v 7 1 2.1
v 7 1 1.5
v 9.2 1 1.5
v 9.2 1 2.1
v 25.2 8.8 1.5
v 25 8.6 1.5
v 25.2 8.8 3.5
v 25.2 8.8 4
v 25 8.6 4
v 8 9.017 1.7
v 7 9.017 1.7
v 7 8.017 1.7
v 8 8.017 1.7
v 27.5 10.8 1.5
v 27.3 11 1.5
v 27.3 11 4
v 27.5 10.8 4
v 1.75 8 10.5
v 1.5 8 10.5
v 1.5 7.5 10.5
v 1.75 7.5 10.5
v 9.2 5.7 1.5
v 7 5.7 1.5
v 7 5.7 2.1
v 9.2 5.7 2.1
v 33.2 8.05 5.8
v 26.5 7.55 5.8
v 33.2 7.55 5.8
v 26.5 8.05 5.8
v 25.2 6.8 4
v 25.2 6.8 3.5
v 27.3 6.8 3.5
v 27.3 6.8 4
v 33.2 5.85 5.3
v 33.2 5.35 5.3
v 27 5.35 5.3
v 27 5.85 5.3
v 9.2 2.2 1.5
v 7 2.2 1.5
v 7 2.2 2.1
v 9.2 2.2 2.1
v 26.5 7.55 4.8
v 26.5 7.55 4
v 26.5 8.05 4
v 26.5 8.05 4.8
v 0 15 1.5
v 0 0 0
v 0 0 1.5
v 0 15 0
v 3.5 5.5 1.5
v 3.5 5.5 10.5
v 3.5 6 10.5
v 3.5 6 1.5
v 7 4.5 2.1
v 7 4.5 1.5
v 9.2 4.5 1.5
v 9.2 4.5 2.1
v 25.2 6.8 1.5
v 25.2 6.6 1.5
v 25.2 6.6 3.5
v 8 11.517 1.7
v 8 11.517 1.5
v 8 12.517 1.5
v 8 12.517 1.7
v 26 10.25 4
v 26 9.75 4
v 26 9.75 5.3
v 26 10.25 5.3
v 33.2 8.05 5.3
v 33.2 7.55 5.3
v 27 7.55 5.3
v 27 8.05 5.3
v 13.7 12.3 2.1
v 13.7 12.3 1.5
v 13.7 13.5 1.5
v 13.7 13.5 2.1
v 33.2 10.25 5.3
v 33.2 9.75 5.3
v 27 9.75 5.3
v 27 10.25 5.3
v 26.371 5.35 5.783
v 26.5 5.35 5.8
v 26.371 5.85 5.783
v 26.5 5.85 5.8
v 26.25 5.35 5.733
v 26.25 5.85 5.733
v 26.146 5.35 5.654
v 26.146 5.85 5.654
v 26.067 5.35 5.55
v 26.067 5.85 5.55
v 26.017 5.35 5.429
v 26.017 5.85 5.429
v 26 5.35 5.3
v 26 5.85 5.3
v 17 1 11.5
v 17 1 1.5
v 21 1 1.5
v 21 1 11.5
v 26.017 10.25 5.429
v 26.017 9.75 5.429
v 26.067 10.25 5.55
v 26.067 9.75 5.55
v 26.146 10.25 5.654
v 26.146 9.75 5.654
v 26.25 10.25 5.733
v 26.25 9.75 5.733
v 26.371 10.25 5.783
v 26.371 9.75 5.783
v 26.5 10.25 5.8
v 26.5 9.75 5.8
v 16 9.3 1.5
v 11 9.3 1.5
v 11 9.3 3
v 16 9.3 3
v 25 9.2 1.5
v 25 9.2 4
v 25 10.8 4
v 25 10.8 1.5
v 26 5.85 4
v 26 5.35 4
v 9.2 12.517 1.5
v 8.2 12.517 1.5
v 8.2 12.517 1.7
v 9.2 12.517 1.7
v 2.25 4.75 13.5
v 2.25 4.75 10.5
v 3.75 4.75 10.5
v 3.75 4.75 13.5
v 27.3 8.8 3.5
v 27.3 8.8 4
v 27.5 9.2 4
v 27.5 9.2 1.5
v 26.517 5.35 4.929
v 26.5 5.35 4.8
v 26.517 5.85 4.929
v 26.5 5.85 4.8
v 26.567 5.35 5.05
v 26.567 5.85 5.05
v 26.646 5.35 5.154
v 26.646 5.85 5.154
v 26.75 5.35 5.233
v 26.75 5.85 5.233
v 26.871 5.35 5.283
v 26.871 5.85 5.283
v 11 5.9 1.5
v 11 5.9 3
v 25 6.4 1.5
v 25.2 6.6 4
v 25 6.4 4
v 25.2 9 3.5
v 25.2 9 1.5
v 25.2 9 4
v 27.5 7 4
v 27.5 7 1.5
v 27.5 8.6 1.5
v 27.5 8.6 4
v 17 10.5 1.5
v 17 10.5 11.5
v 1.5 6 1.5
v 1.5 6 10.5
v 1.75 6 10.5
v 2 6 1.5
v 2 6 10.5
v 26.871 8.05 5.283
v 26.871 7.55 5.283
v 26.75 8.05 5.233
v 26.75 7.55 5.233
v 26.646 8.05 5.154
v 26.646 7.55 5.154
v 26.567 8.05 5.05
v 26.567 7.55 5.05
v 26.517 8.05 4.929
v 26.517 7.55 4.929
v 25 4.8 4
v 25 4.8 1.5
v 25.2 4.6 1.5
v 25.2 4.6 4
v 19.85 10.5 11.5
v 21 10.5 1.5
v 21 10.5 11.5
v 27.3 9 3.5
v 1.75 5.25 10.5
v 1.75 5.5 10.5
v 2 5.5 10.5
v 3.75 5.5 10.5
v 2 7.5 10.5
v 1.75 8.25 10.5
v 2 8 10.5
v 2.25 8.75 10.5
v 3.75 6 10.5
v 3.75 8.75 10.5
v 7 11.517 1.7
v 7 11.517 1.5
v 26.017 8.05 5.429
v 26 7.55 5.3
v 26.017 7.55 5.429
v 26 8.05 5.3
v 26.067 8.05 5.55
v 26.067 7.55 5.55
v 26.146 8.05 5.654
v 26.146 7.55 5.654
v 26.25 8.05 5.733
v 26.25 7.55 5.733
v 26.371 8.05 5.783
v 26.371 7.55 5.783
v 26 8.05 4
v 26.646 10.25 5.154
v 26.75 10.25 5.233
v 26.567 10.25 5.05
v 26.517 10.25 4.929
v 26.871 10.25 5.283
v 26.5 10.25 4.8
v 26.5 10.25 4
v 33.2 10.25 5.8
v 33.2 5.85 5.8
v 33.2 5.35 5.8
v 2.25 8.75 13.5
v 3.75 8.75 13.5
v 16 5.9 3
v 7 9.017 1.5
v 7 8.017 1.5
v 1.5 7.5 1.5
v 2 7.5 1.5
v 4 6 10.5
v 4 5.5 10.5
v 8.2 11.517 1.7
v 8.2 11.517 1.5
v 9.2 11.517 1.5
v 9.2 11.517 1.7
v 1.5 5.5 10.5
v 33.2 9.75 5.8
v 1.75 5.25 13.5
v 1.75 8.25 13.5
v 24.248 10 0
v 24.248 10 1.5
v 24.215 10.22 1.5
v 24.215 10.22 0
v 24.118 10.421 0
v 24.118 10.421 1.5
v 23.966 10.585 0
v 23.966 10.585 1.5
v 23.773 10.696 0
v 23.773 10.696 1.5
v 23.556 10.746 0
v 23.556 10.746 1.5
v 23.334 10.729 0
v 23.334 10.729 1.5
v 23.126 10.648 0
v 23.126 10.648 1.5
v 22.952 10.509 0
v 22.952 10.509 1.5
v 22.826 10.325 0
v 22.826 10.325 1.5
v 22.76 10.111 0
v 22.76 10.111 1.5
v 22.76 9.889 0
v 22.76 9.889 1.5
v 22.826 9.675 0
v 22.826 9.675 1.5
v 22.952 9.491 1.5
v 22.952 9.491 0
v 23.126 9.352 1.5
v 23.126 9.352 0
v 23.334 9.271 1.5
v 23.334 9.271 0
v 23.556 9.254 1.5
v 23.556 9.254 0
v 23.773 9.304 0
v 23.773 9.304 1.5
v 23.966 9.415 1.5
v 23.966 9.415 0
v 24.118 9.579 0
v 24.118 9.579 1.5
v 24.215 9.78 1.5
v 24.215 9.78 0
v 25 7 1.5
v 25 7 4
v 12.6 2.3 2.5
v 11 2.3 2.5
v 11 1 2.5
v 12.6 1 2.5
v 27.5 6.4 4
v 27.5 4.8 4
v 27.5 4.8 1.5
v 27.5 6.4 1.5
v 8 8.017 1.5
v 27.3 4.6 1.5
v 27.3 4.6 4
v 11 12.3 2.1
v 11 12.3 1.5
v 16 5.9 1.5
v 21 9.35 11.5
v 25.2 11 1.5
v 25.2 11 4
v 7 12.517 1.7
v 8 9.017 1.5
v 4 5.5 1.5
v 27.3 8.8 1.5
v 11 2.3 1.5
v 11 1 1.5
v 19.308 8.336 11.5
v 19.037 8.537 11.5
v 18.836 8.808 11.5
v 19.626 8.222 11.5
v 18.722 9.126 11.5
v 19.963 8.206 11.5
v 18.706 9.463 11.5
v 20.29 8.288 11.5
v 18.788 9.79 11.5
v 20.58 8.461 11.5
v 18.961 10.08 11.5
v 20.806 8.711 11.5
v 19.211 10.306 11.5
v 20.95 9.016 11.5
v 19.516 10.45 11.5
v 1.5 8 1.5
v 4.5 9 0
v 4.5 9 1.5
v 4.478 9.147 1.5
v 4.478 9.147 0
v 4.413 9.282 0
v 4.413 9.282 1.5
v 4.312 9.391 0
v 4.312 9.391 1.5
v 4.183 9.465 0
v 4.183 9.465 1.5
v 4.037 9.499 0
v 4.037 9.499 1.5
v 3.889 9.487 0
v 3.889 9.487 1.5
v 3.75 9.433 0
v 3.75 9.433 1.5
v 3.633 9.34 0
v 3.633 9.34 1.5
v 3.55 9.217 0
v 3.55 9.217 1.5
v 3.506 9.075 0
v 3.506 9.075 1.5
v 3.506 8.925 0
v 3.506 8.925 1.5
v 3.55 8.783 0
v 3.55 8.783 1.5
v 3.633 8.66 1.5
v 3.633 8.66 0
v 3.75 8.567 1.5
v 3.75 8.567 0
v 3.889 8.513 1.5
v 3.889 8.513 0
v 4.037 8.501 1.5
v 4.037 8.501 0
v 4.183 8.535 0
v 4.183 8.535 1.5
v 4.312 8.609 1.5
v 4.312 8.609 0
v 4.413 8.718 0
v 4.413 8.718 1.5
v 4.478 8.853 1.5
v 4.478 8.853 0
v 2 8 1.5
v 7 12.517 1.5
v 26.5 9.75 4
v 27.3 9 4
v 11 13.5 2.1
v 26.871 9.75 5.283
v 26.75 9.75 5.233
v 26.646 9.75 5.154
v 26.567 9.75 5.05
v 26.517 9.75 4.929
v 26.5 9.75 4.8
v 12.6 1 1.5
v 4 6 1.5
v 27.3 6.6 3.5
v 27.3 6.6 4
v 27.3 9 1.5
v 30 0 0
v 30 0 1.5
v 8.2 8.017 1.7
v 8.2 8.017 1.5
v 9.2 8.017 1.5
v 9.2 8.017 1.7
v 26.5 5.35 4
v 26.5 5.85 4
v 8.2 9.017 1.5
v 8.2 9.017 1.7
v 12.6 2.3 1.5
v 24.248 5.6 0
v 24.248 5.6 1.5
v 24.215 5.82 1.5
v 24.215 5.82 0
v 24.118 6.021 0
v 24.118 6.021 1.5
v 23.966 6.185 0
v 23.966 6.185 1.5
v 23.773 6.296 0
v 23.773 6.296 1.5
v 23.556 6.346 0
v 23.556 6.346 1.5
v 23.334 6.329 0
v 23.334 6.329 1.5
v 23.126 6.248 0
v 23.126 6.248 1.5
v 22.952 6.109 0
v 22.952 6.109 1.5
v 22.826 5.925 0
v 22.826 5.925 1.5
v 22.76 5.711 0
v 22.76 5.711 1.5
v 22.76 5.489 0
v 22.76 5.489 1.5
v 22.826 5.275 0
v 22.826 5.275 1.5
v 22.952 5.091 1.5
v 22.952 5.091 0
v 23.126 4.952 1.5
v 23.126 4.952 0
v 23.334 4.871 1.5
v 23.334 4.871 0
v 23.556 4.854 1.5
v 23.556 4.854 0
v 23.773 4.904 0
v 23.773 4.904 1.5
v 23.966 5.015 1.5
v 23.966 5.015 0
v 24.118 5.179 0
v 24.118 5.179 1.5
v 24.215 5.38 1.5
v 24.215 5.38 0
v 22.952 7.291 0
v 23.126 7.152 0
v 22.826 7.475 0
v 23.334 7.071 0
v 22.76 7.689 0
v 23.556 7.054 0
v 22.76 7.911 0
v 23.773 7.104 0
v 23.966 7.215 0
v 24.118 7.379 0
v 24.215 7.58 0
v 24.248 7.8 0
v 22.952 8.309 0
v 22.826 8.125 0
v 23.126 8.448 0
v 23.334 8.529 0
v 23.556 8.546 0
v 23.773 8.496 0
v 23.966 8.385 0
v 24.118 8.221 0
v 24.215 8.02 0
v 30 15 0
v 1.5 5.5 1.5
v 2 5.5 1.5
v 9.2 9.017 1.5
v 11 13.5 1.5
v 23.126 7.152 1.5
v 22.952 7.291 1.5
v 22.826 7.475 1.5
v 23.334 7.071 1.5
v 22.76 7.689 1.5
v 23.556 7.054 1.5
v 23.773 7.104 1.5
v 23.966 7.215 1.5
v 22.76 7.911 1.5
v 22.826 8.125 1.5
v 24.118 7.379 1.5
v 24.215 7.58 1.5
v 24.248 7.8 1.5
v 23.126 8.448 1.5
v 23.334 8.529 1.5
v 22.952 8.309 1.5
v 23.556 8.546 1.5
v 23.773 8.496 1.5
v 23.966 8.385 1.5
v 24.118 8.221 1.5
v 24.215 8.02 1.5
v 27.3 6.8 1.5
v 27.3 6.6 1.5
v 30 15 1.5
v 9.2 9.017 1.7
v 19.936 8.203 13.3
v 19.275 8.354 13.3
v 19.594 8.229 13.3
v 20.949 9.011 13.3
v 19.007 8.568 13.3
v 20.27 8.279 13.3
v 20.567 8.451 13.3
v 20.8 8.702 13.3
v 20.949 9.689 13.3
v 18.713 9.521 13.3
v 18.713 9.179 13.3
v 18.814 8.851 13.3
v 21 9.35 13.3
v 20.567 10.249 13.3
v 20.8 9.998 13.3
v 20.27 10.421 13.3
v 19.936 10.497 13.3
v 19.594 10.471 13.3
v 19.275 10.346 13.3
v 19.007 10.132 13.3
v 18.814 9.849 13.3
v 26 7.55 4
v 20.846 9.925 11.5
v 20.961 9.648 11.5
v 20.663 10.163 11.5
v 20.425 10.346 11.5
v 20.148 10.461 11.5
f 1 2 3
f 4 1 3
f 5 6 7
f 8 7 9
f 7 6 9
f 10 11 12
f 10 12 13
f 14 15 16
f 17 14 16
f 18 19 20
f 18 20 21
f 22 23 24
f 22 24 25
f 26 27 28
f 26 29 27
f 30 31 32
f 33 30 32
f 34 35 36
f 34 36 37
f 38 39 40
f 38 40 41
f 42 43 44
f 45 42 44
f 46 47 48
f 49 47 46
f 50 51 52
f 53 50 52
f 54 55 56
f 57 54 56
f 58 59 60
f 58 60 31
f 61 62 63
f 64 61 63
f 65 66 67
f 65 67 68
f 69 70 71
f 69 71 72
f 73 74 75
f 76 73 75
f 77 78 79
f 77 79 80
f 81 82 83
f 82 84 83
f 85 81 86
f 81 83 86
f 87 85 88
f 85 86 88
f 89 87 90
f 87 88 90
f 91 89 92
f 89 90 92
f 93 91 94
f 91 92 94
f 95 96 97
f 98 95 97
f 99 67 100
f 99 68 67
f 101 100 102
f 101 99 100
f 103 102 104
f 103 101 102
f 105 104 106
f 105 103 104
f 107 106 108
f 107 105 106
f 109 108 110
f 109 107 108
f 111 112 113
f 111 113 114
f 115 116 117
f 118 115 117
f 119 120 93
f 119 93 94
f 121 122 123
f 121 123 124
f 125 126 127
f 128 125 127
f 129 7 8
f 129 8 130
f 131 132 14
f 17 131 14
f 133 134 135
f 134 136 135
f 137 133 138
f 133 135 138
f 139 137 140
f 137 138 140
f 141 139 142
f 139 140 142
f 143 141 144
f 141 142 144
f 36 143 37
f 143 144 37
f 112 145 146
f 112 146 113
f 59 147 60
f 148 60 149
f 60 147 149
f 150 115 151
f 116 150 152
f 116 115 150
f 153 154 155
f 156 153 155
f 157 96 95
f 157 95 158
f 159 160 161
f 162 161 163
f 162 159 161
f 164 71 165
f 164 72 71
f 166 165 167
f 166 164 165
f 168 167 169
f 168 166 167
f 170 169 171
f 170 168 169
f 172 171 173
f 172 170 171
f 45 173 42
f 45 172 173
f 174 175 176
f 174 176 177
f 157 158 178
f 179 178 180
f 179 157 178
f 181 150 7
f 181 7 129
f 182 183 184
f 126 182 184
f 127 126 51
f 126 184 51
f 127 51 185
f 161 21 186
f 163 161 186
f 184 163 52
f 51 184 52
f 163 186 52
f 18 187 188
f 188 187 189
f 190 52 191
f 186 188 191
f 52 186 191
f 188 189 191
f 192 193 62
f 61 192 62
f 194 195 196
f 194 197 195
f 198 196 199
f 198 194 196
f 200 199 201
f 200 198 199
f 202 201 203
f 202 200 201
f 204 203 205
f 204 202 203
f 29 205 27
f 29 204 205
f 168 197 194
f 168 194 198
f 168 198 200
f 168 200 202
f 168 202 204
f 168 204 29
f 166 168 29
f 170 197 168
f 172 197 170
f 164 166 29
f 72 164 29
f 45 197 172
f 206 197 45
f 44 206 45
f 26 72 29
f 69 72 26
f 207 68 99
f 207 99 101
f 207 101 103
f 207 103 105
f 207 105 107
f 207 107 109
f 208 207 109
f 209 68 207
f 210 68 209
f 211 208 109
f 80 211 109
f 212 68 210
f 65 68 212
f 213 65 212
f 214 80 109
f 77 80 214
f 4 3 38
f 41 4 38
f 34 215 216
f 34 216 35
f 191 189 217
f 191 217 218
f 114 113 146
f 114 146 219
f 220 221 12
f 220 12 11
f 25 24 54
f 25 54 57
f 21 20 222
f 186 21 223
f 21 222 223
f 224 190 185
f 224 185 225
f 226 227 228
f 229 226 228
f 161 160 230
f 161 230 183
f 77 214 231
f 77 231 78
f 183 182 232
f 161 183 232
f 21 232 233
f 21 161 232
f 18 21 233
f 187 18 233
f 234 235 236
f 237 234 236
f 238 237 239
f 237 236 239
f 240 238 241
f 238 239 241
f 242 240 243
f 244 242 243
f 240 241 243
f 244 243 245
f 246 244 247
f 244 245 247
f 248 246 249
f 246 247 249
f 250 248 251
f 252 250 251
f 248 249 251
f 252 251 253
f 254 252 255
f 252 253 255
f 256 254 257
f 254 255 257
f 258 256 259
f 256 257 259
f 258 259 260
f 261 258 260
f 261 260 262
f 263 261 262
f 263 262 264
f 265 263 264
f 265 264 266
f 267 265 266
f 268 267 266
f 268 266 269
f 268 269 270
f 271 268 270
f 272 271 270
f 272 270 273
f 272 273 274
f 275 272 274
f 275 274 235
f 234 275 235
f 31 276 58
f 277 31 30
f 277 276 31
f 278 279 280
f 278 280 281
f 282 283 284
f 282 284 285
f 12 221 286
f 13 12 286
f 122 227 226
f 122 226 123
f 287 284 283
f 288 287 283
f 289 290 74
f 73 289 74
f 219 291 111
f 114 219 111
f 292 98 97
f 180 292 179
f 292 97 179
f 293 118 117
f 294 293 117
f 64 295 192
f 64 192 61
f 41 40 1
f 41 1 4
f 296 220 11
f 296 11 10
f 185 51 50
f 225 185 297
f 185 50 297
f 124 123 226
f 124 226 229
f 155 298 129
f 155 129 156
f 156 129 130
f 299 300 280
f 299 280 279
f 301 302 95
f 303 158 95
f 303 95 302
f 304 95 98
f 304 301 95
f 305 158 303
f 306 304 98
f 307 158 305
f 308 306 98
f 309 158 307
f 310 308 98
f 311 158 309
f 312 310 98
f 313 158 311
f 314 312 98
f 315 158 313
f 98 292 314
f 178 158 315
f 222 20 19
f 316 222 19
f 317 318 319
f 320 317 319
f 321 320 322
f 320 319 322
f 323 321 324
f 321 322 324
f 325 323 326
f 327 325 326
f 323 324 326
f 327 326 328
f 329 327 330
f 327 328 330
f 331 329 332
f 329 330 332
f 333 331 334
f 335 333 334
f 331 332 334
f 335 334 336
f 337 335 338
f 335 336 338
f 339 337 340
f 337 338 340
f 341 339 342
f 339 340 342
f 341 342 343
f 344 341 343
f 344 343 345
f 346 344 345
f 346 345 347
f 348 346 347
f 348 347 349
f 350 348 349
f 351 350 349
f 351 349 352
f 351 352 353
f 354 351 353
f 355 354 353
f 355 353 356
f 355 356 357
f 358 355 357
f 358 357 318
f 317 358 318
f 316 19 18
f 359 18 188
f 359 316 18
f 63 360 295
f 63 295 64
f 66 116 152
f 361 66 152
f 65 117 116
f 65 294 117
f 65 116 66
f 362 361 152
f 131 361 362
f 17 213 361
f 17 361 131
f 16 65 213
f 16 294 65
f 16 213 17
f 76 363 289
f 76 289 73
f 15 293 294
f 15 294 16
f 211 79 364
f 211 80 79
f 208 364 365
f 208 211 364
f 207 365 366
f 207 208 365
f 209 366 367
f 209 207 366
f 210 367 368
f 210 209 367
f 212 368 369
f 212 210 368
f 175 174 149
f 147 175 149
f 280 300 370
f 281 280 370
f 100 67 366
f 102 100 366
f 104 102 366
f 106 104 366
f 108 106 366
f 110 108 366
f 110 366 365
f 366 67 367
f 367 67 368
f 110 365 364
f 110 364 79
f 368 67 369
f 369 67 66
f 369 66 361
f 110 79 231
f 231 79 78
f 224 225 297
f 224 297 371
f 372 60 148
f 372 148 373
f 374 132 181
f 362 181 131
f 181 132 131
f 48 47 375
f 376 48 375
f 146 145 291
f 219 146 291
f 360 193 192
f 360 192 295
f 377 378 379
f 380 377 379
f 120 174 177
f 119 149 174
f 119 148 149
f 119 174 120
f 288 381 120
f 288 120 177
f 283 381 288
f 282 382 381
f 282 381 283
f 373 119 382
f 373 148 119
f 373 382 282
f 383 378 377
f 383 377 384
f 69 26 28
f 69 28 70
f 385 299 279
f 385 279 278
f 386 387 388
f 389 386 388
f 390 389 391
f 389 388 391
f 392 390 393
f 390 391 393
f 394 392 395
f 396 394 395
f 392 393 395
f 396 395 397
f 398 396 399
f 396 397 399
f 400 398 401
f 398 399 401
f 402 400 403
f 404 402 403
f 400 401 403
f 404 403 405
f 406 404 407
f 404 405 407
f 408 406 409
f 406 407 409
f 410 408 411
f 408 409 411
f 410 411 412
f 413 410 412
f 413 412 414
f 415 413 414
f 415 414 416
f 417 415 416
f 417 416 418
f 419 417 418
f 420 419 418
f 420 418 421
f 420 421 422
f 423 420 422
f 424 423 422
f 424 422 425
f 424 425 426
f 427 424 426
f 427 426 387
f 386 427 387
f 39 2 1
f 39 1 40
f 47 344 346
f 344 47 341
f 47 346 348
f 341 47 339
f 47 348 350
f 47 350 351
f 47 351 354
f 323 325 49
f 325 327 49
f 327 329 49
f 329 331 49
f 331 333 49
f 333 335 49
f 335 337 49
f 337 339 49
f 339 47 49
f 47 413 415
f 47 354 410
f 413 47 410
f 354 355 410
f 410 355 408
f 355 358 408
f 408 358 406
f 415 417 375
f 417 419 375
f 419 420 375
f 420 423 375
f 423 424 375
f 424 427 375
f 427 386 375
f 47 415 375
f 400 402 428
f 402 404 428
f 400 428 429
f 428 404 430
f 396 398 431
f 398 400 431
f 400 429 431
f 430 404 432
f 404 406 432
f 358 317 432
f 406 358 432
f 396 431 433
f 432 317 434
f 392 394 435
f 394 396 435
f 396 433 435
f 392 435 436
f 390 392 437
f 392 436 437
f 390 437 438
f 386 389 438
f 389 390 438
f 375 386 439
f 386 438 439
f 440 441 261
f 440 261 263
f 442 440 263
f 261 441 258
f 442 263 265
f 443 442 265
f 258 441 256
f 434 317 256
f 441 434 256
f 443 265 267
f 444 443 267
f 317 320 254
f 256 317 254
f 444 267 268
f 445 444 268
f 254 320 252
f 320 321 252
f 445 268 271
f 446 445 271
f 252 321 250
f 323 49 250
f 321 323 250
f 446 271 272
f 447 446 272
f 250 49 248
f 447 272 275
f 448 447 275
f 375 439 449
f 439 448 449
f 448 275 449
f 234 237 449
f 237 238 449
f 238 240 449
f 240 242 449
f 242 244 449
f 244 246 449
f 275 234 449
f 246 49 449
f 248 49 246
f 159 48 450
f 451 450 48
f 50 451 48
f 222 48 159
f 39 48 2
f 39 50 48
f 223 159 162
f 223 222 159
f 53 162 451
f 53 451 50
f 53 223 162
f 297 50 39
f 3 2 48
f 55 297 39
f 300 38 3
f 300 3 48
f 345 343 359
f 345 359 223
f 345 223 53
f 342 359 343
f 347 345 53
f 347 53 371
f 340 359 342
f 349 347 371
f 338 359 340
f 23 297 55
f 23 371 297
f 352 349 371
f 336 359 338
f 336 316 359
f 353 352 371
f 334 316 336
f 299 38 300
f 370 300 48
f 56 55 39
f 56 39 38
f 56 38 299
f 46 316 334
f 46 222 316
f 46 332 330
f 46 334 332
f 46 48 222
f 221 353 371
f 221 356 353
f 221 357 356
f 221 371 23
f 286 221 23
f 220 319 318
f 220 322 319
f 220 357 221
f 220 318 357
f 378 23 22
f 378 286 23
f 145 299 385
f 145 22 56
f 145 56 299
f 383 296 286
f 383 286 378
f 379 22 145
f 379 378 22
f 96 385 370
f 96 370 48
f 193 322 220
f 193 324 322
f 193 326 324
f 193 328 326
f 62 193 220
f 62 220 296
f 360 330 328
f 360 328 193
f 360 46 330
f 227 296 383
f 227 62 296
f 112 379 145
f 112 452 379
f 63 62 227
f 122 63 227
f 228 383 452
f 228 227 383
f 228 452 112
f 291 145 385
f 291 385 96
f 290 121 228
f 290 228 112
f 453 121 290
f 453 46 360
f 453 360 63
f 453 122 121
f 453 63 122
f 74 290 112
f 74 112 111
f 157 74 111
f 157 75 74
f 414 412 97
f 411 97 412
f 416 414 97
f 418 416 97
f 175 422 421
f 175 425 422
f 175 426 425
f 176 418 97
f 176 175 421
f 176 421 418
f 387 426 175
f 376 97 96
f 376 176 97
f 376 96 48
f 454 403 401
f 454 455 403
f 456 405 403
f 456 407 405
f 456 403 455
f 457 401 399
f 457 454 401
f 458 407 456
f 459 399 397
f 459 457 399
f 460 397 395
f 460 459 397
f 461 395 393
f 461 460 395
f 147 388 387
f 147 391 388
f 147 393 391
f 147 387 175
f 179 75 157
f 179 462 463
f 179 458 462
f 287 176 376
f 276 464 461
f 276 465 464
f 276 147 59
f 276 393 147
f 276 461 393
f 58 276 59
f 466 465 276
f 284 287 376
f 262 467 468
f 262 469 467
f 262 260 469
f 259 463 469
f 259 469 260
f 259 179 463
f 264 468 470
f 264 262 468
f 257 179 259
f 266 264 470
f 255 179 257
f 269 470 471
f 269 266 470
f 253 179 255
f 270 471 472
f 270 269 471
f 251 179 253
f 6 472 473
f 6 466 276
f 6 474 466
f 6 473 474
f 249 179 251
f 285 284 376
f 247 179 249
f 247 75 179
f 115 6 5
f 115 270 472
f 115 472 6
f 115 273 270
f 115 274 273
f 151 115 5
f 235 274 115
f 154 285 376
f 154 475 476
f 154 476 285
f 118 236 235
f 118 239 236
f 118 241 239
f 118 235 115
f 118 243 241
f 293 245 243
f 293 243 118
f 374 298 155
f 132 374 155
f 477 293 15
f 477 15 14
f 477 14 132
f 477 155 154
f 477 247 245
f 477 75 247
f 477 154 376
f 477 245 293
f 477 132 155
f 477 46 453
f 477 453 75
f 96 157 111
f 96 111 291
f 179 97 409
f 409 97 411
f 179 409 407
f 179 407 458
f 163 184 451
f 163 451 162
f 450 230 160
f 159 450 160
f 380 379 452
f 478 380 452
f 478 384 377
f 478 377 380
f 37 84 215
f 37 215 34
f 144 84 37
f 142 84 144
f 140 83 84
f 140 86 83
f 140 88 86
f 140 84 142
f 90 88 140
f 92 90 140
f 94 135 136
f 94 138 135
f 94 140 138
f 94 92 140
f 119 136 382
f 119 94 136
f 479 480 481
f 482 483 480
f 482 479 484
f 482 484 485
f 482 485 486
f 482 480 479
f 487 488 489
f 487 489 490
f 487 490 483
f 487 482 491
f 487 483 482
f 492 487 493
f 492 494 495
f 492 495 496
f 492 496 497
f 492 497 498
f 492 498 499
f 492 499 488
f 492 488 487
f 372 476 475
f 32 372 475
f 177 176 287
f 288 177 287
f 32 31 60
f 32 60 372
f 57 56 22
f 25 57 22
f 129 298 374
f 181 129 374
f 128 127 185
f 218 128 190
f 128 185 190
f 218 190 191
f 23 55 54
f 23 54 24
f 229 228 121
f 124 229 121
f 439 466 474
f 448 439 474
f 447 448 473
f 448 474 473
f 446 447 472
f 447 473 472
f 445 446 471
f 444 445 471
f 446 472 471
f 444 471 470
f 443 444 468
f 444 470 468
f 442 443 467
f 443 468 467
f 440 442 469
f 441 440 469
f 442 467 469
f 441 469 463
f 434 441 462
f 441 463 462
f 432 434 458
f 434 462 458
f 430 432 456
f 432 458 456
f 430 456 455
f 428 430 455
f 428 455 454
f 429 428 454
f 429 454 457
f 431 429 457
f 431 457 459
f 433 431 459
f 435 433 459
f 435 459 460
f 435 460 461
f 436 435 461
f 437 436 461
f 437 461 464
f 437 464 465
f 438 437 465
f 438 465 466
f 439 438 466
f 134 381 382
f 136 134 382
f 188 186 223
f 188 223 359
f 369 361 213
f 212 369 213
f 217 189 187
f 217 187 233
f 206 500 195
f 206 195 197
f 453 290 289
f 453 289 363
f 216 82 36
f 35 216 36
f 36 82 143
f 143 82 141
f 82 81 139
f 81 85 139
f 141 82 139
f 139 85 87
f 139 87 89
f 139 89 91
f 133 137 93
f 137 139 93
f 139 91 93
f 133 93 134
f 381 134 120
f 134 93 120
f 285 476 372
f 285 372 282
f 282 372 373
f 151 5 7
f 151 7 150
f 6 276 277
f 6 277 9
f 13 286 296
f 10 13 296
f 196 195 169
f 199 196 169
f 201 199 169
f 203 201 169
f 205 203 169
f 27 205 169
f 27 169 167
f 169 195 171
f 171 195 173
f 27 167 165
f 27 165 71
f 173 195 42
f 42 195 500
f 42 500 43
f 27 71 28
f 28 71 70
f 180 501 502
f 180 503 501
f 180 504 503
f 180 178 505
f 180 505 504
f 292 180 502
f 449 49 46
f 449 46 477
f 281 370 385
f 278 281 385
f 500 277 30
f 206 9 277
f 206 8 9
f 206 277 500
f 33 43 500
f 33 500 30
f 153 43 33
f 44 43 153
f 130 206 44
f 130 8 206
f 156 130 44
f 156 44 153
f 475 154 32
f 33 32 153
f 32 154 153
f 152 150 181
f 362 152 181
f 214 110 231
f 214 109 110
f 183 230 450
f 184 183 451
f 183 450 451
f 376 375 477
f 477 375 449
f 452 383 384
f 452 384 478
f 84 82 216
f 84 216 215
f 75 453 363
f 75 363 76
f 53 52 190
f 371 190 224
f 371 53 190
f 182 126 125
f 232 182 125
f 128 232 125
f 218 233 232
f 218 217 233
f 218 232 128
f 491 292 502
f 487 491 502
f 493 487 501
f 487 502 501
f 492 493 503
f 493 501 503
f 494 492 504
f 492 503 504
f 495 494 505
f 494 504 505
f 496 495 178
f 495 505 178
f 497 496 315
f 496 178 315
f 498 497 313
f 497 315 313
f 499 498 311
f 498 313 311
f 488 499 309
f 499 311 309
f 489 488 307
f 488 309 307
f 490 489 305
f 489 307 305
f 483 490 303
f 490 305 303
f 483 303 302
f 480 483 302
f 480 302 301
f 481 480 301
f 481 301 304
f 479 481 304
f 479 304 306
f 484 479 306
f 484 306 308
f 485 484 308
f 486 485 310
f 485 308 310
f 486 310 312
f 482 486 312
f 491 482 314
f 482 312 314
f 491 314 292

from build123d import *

# Parameters (mm, degrees)
SKETCH_1_W          = 30
SKETCH_1_H          = 15
EXTRUDE_1_DEPTH     = 1.5
SKETCH_2_W          = 4
SKETCH_2_H          = 9.5
EXTRUDE_2_DEPTH     = 10
SKETCH_3_R          = 1.15
EXTRUDE_3_DEPTH     = 1.8
SKETCH_5_W          = 2.5
SKETCH_5_H          = 2
EXTRUDE_4_DEPTH     = 2.5
CHAMFER_1_SIZE      = 0.2
SKETCH_6_W          = 2.1
SKETCH_6_H          = 0.2
EXTRUDE_5_DEPTH     = 2
SKETCH_7_W          = 0.5
SKETCH_7_H          = 0.5
EXTRUDE_6_DEPTH     = 1.8
SKETCH_8_W          = 0.5
SKETCH_8_H          = 0.5
EXTRUDE_7_DEPTH     = 6.7
FILLET_1_R          = 0.5
SKETCH_10_R         = 0.747999162
CUT_EXTRUDE_1_DEPTH = 39.294647146
SKETCH_11_W         = 5
SKETCH_11_H         = 3.4
EXTRUDE_8_DEPTH     = 1.5
SKETCH_12_W         = 2.7
SKETCH_12_H         = 1.2
EXTRUDE_9_DEPTH     = 0.6
SKETCH_13_W         = 1.6
SKETCH_13_H         = 1.3
EXTRUDE_10_DEPTH    = 1
SKETCH_14_W         = 1
SKETCH_14_H         = 1
EXTRUDE_11_DEPTH    = 0.2
SKETCH_15_W         = 2.2
SKETCH_15_H         = 1.2
EXTRUDE_12_DEPTH    = 0.6
SKETCH_17_R         = 0.5
CUT_EXTRUDE_2_DEPTH = 39.294647146
SKETCH_18_W         = 0.5
SKETCH_18_H         = 0.5
EXTRUDE_13_DEPTH    = 9
SKETCH_20_W         = 2
SKETCH_20_H         = 4
EXTRUDE_14_DEPTH    = 3
CHAMFER_2_SIZE      = 0.5


with BuildPart() as part:
    # 草图1 → 凸台-拉伸1 (new body)
    with BuildSketch(Plane.XY):
        with Locations((15, 7.5)):
            Rectangle(SKETCH_1_W, SKETCH_1_H)
    extrude(amount=EXTRUDE_1_DEPTH)

    # 草图2 → 凸台-拉伸2 (add)
    with BuildSketch(Plane.XY.offset(1.5)):
        with Locations((19, 5.75)):
            Rectangle(SKETCH_2_W, SKETCH_2_H)
    extrude(amount=EXTRUDE_2_DEPTH)

    # 草图3 → 凸台-拉伸3 (add)
    with BuildSketch(Plane.XY.offset(11.5)):
        with Locations((19.85, 9.35)):
            Circle(SKETCH_3_R)
    extrude(amount=EXTRUDE_3_DEPTH)

    # 草图5 → 凸台-拉伸4 (add)
    with BuildSketch(Plane.XY.offset(1.5)):
        with Locations((26.25, 10)):
            Rectangle(SKETCH_5_W, SKETCH_5_H)
        with Locations((26.25, 7.8)):
            Rectangle(SKETCH_5_W, SKETCH_5_H)
        with Locations((26.25, 5.6)):
            Rectangle(SKETCH_5_W, SKETCH_5_H)
    extrude(amount=EXTRUDE_4_DEPTH)

    # 倒角1
    chamfer_1_edges = [part.edges().sort_by_distance(p)[0] for p in [
        (25, 11, 2.75),
        (25, 9, 2.75),
        (27.5, 9, 2.75),
        (27.5, 11, 2.75),
        (27.5, 8.8, 2.75),
        (25, 8.8, 2.75),
        (25, 6.8, 2.75),
        (27.5, 6.8, 2.75),
        (27.5, 6.6, 2.75),
        (25, 6.6, 2.75),
        (25, 4.6, 2.75),
        (27.5, 4.6, 2.75),
    ]]
    chamfer(chamfer_1_edges, length=CHAMFER_1_SIZE)

    # 草图6 → 凸台-拉伸5 (add)
    with BuildSketch(Plane.XY.offset(1.5)):
        with Locations((26.25, 8.9)):
            Rectangle(SKETCH_6_W, SKETCH_6_H)
        with Locations((26.25, 6.7)):
            Rectangle(SKETCH_6_W, SKETCH_6_H)
    extrude(amount=EXTRUDE_5_DEPTH)

    # 草图7 → 凸台-拉伸6 (add)
    with BuildSketch(Plane.XY.offset(4)):
        with Locations((26.25, 5.6)):
            Rectangle(SKETCH_7_W, SKETCH_7_H)
        with Locations((26.25, 7.8)):
            Rectangle(SKETCH_7_W, SKETCH_7_H)
        with Locations((26.25, 10)):
            Rectangle(SKETCH_7_W, SKETCH_7_H)
    extrude(amount=EXTRUDE_6_DEPTH)

    # 草图8 → 凸台-拉伸7 (add)
    with BuildSketch(Plane(origin=(26.5, 0, 0), x_dir=(0, 0, -1), z_dir=(1, 0, 0))):
        with Locations((-5.55, 5.6)):
            Rectangle(SKETCH_8_W, SKETCH_8_H)
        with Locations((-5.55, 7.8)):
            Rectangle(SKETCH_8_W, SKETCH_8_H)
        with Locations((-5.55, 10)):
            Rectangle(SKETCH_8_W, SKETCH_8_H)
    extrude(amount=EXTRUDE_7_DEPTH)

    # 圆角1
    fillet_1_edges = [part.edges().sort_by_distance(p)[0] for p in [
        (26, 5.6, 5.8),
        (26, 7.8, 5.8),
        (26, 10, 5.8),
        (26.5, 5.6, 5.3),
        (26.5, 7.8, 5.3),
        (26.5, 10, 5.3),
    ]]
    fillet(fillet_1_edges, radius=FILLET_1_R)

    # 草图10 → 切除-拉伸1 (cut, through all)
    with BuildSketch(Plane.XY.offset(1.5)):
        with Locations((23.5, 10)):
            Circle(SKETCH_10_R)
        with Locations((23.5, 7.8)):
            Circle(SKETCH_10_R)
        with Locations((23.5, 5.6)):
            Circle(SKETCH_10_R)
    extrude(amount=-CUT_EXTRUDE_1_DEPTH, mode=Mode.SUBTRACT)

    # 草图11 → 凸台-拉伸8 (add)
    with BuildSketch(Plane.XY.offset(1.5)):
        with Locations((13.5, 7.6)):
            Rectangle(SKETCH_11_W, SKETCH_11_H)
    extrude(amount=EXTRUDE_8_DEPTH)

    # 草图12 → 凸台-拉伸9 (add)
    with BuildSketch(Plane.XY.offset(1.5)):
        with Locations((12.35, 12.9)):
            Rectangle(SKETCH_12_W, SKETCH_12_H)
    extrude(amount=EXTRUDE_9_DEPTH)

    # 草图13 → 凸台-拉伸10 (add)
    with BuildSketch(Plane.XY.offset(1.5)):
        with Locations((11.8, 1.65)):
            Rectangle(SKETCH_13_W, SKETCH_13_H)
    extrude(amount=EXTRUDE_10_DEPTH)

    # 草图14 → 凸台-拉伸11 (add)
    with BuildSketch(Plane.XY.offset(1.5)):
        with Locations((7.5, 12.016968403)):
            Rectangle(SKETCH_14_W, SKETCH_14_H)
        with Locations((8.7, 12.016968403)):
            Rectangle(SKETCH_14_W, SKETCH_14_H)
        with Locations((8.7, 8.516968403)):
            Rectangle(SKETCH_14_W, SKETCH_14_H)
        with Locations((7.5, 8.516968403)):
            Rectangle(SKETCH_14_W, SKETCH_14_H)
    extrude(amount=EXTRUDE_11_DEPTH)

    # 草图15 → 凸台-拉伸12 (add)
    with BuildSketch(Plane.XY.offset(1.5)):
        with Locations((8.1, 5.1)):
            Rectangle(SKETCH_15_W, SKETCH_15_H)
        with Locations((8.1, 1.6)):
            Rectangle(SKETCH_15_W, SKETCH_15_H)
    extrude(amount=EXTRUDE_12_DEPTH)

    # 草图17 → 切除-拉伸2 (cut, through all)
    with BuildSketch(Plane.XY.offset(1.5)):
        with Locations((4, 9)):
            Circle(SKETCH_17_R)
    extrude(amount=-CUT_EXTRUDE_2_DEPTH, mode=Mode.SUBTRACT)

    # 草图18 → 凸台-拉伸13 (add)
    with BuildSketch(Plane.XY.offset(1.5)):
        with Locations((3.75, 5.75)):
            Rectangle(SKETCH_18_W, SKETCH_18_H)
        with Locations((1.75, 7.75)):
            Rectangle(SKETCH_18_W, SKETCH_18_H)
        with Locations((1.75, 5.75)):
            Rectangle(SKETCH_18_W, SKETCH_18_H)
    extrude(amount=EXTRUDE_13_DEPTH)

    # 草图20 → 凸台-拉伸14 (add)
    with BuildSketch(Plane.XY.offset(10.5)):
        with Locations((2.75, 6.75)):
            Rectangle(SKETCH_20_W, SKETCH_20_H)
    extrude(amount=EXTRUDE_14_DEPTH)

    # 倒角2
    chamfer_2_edges = [part.edges().sort_by_distance(p)[0] for p in [
        (1.75, 8.75, 12),
        (1.75, 4.75, 12),
    ]]
    chamfer(chamfer_2_edges, length=CHAMFER_2_SIZE)


solid = part.part
